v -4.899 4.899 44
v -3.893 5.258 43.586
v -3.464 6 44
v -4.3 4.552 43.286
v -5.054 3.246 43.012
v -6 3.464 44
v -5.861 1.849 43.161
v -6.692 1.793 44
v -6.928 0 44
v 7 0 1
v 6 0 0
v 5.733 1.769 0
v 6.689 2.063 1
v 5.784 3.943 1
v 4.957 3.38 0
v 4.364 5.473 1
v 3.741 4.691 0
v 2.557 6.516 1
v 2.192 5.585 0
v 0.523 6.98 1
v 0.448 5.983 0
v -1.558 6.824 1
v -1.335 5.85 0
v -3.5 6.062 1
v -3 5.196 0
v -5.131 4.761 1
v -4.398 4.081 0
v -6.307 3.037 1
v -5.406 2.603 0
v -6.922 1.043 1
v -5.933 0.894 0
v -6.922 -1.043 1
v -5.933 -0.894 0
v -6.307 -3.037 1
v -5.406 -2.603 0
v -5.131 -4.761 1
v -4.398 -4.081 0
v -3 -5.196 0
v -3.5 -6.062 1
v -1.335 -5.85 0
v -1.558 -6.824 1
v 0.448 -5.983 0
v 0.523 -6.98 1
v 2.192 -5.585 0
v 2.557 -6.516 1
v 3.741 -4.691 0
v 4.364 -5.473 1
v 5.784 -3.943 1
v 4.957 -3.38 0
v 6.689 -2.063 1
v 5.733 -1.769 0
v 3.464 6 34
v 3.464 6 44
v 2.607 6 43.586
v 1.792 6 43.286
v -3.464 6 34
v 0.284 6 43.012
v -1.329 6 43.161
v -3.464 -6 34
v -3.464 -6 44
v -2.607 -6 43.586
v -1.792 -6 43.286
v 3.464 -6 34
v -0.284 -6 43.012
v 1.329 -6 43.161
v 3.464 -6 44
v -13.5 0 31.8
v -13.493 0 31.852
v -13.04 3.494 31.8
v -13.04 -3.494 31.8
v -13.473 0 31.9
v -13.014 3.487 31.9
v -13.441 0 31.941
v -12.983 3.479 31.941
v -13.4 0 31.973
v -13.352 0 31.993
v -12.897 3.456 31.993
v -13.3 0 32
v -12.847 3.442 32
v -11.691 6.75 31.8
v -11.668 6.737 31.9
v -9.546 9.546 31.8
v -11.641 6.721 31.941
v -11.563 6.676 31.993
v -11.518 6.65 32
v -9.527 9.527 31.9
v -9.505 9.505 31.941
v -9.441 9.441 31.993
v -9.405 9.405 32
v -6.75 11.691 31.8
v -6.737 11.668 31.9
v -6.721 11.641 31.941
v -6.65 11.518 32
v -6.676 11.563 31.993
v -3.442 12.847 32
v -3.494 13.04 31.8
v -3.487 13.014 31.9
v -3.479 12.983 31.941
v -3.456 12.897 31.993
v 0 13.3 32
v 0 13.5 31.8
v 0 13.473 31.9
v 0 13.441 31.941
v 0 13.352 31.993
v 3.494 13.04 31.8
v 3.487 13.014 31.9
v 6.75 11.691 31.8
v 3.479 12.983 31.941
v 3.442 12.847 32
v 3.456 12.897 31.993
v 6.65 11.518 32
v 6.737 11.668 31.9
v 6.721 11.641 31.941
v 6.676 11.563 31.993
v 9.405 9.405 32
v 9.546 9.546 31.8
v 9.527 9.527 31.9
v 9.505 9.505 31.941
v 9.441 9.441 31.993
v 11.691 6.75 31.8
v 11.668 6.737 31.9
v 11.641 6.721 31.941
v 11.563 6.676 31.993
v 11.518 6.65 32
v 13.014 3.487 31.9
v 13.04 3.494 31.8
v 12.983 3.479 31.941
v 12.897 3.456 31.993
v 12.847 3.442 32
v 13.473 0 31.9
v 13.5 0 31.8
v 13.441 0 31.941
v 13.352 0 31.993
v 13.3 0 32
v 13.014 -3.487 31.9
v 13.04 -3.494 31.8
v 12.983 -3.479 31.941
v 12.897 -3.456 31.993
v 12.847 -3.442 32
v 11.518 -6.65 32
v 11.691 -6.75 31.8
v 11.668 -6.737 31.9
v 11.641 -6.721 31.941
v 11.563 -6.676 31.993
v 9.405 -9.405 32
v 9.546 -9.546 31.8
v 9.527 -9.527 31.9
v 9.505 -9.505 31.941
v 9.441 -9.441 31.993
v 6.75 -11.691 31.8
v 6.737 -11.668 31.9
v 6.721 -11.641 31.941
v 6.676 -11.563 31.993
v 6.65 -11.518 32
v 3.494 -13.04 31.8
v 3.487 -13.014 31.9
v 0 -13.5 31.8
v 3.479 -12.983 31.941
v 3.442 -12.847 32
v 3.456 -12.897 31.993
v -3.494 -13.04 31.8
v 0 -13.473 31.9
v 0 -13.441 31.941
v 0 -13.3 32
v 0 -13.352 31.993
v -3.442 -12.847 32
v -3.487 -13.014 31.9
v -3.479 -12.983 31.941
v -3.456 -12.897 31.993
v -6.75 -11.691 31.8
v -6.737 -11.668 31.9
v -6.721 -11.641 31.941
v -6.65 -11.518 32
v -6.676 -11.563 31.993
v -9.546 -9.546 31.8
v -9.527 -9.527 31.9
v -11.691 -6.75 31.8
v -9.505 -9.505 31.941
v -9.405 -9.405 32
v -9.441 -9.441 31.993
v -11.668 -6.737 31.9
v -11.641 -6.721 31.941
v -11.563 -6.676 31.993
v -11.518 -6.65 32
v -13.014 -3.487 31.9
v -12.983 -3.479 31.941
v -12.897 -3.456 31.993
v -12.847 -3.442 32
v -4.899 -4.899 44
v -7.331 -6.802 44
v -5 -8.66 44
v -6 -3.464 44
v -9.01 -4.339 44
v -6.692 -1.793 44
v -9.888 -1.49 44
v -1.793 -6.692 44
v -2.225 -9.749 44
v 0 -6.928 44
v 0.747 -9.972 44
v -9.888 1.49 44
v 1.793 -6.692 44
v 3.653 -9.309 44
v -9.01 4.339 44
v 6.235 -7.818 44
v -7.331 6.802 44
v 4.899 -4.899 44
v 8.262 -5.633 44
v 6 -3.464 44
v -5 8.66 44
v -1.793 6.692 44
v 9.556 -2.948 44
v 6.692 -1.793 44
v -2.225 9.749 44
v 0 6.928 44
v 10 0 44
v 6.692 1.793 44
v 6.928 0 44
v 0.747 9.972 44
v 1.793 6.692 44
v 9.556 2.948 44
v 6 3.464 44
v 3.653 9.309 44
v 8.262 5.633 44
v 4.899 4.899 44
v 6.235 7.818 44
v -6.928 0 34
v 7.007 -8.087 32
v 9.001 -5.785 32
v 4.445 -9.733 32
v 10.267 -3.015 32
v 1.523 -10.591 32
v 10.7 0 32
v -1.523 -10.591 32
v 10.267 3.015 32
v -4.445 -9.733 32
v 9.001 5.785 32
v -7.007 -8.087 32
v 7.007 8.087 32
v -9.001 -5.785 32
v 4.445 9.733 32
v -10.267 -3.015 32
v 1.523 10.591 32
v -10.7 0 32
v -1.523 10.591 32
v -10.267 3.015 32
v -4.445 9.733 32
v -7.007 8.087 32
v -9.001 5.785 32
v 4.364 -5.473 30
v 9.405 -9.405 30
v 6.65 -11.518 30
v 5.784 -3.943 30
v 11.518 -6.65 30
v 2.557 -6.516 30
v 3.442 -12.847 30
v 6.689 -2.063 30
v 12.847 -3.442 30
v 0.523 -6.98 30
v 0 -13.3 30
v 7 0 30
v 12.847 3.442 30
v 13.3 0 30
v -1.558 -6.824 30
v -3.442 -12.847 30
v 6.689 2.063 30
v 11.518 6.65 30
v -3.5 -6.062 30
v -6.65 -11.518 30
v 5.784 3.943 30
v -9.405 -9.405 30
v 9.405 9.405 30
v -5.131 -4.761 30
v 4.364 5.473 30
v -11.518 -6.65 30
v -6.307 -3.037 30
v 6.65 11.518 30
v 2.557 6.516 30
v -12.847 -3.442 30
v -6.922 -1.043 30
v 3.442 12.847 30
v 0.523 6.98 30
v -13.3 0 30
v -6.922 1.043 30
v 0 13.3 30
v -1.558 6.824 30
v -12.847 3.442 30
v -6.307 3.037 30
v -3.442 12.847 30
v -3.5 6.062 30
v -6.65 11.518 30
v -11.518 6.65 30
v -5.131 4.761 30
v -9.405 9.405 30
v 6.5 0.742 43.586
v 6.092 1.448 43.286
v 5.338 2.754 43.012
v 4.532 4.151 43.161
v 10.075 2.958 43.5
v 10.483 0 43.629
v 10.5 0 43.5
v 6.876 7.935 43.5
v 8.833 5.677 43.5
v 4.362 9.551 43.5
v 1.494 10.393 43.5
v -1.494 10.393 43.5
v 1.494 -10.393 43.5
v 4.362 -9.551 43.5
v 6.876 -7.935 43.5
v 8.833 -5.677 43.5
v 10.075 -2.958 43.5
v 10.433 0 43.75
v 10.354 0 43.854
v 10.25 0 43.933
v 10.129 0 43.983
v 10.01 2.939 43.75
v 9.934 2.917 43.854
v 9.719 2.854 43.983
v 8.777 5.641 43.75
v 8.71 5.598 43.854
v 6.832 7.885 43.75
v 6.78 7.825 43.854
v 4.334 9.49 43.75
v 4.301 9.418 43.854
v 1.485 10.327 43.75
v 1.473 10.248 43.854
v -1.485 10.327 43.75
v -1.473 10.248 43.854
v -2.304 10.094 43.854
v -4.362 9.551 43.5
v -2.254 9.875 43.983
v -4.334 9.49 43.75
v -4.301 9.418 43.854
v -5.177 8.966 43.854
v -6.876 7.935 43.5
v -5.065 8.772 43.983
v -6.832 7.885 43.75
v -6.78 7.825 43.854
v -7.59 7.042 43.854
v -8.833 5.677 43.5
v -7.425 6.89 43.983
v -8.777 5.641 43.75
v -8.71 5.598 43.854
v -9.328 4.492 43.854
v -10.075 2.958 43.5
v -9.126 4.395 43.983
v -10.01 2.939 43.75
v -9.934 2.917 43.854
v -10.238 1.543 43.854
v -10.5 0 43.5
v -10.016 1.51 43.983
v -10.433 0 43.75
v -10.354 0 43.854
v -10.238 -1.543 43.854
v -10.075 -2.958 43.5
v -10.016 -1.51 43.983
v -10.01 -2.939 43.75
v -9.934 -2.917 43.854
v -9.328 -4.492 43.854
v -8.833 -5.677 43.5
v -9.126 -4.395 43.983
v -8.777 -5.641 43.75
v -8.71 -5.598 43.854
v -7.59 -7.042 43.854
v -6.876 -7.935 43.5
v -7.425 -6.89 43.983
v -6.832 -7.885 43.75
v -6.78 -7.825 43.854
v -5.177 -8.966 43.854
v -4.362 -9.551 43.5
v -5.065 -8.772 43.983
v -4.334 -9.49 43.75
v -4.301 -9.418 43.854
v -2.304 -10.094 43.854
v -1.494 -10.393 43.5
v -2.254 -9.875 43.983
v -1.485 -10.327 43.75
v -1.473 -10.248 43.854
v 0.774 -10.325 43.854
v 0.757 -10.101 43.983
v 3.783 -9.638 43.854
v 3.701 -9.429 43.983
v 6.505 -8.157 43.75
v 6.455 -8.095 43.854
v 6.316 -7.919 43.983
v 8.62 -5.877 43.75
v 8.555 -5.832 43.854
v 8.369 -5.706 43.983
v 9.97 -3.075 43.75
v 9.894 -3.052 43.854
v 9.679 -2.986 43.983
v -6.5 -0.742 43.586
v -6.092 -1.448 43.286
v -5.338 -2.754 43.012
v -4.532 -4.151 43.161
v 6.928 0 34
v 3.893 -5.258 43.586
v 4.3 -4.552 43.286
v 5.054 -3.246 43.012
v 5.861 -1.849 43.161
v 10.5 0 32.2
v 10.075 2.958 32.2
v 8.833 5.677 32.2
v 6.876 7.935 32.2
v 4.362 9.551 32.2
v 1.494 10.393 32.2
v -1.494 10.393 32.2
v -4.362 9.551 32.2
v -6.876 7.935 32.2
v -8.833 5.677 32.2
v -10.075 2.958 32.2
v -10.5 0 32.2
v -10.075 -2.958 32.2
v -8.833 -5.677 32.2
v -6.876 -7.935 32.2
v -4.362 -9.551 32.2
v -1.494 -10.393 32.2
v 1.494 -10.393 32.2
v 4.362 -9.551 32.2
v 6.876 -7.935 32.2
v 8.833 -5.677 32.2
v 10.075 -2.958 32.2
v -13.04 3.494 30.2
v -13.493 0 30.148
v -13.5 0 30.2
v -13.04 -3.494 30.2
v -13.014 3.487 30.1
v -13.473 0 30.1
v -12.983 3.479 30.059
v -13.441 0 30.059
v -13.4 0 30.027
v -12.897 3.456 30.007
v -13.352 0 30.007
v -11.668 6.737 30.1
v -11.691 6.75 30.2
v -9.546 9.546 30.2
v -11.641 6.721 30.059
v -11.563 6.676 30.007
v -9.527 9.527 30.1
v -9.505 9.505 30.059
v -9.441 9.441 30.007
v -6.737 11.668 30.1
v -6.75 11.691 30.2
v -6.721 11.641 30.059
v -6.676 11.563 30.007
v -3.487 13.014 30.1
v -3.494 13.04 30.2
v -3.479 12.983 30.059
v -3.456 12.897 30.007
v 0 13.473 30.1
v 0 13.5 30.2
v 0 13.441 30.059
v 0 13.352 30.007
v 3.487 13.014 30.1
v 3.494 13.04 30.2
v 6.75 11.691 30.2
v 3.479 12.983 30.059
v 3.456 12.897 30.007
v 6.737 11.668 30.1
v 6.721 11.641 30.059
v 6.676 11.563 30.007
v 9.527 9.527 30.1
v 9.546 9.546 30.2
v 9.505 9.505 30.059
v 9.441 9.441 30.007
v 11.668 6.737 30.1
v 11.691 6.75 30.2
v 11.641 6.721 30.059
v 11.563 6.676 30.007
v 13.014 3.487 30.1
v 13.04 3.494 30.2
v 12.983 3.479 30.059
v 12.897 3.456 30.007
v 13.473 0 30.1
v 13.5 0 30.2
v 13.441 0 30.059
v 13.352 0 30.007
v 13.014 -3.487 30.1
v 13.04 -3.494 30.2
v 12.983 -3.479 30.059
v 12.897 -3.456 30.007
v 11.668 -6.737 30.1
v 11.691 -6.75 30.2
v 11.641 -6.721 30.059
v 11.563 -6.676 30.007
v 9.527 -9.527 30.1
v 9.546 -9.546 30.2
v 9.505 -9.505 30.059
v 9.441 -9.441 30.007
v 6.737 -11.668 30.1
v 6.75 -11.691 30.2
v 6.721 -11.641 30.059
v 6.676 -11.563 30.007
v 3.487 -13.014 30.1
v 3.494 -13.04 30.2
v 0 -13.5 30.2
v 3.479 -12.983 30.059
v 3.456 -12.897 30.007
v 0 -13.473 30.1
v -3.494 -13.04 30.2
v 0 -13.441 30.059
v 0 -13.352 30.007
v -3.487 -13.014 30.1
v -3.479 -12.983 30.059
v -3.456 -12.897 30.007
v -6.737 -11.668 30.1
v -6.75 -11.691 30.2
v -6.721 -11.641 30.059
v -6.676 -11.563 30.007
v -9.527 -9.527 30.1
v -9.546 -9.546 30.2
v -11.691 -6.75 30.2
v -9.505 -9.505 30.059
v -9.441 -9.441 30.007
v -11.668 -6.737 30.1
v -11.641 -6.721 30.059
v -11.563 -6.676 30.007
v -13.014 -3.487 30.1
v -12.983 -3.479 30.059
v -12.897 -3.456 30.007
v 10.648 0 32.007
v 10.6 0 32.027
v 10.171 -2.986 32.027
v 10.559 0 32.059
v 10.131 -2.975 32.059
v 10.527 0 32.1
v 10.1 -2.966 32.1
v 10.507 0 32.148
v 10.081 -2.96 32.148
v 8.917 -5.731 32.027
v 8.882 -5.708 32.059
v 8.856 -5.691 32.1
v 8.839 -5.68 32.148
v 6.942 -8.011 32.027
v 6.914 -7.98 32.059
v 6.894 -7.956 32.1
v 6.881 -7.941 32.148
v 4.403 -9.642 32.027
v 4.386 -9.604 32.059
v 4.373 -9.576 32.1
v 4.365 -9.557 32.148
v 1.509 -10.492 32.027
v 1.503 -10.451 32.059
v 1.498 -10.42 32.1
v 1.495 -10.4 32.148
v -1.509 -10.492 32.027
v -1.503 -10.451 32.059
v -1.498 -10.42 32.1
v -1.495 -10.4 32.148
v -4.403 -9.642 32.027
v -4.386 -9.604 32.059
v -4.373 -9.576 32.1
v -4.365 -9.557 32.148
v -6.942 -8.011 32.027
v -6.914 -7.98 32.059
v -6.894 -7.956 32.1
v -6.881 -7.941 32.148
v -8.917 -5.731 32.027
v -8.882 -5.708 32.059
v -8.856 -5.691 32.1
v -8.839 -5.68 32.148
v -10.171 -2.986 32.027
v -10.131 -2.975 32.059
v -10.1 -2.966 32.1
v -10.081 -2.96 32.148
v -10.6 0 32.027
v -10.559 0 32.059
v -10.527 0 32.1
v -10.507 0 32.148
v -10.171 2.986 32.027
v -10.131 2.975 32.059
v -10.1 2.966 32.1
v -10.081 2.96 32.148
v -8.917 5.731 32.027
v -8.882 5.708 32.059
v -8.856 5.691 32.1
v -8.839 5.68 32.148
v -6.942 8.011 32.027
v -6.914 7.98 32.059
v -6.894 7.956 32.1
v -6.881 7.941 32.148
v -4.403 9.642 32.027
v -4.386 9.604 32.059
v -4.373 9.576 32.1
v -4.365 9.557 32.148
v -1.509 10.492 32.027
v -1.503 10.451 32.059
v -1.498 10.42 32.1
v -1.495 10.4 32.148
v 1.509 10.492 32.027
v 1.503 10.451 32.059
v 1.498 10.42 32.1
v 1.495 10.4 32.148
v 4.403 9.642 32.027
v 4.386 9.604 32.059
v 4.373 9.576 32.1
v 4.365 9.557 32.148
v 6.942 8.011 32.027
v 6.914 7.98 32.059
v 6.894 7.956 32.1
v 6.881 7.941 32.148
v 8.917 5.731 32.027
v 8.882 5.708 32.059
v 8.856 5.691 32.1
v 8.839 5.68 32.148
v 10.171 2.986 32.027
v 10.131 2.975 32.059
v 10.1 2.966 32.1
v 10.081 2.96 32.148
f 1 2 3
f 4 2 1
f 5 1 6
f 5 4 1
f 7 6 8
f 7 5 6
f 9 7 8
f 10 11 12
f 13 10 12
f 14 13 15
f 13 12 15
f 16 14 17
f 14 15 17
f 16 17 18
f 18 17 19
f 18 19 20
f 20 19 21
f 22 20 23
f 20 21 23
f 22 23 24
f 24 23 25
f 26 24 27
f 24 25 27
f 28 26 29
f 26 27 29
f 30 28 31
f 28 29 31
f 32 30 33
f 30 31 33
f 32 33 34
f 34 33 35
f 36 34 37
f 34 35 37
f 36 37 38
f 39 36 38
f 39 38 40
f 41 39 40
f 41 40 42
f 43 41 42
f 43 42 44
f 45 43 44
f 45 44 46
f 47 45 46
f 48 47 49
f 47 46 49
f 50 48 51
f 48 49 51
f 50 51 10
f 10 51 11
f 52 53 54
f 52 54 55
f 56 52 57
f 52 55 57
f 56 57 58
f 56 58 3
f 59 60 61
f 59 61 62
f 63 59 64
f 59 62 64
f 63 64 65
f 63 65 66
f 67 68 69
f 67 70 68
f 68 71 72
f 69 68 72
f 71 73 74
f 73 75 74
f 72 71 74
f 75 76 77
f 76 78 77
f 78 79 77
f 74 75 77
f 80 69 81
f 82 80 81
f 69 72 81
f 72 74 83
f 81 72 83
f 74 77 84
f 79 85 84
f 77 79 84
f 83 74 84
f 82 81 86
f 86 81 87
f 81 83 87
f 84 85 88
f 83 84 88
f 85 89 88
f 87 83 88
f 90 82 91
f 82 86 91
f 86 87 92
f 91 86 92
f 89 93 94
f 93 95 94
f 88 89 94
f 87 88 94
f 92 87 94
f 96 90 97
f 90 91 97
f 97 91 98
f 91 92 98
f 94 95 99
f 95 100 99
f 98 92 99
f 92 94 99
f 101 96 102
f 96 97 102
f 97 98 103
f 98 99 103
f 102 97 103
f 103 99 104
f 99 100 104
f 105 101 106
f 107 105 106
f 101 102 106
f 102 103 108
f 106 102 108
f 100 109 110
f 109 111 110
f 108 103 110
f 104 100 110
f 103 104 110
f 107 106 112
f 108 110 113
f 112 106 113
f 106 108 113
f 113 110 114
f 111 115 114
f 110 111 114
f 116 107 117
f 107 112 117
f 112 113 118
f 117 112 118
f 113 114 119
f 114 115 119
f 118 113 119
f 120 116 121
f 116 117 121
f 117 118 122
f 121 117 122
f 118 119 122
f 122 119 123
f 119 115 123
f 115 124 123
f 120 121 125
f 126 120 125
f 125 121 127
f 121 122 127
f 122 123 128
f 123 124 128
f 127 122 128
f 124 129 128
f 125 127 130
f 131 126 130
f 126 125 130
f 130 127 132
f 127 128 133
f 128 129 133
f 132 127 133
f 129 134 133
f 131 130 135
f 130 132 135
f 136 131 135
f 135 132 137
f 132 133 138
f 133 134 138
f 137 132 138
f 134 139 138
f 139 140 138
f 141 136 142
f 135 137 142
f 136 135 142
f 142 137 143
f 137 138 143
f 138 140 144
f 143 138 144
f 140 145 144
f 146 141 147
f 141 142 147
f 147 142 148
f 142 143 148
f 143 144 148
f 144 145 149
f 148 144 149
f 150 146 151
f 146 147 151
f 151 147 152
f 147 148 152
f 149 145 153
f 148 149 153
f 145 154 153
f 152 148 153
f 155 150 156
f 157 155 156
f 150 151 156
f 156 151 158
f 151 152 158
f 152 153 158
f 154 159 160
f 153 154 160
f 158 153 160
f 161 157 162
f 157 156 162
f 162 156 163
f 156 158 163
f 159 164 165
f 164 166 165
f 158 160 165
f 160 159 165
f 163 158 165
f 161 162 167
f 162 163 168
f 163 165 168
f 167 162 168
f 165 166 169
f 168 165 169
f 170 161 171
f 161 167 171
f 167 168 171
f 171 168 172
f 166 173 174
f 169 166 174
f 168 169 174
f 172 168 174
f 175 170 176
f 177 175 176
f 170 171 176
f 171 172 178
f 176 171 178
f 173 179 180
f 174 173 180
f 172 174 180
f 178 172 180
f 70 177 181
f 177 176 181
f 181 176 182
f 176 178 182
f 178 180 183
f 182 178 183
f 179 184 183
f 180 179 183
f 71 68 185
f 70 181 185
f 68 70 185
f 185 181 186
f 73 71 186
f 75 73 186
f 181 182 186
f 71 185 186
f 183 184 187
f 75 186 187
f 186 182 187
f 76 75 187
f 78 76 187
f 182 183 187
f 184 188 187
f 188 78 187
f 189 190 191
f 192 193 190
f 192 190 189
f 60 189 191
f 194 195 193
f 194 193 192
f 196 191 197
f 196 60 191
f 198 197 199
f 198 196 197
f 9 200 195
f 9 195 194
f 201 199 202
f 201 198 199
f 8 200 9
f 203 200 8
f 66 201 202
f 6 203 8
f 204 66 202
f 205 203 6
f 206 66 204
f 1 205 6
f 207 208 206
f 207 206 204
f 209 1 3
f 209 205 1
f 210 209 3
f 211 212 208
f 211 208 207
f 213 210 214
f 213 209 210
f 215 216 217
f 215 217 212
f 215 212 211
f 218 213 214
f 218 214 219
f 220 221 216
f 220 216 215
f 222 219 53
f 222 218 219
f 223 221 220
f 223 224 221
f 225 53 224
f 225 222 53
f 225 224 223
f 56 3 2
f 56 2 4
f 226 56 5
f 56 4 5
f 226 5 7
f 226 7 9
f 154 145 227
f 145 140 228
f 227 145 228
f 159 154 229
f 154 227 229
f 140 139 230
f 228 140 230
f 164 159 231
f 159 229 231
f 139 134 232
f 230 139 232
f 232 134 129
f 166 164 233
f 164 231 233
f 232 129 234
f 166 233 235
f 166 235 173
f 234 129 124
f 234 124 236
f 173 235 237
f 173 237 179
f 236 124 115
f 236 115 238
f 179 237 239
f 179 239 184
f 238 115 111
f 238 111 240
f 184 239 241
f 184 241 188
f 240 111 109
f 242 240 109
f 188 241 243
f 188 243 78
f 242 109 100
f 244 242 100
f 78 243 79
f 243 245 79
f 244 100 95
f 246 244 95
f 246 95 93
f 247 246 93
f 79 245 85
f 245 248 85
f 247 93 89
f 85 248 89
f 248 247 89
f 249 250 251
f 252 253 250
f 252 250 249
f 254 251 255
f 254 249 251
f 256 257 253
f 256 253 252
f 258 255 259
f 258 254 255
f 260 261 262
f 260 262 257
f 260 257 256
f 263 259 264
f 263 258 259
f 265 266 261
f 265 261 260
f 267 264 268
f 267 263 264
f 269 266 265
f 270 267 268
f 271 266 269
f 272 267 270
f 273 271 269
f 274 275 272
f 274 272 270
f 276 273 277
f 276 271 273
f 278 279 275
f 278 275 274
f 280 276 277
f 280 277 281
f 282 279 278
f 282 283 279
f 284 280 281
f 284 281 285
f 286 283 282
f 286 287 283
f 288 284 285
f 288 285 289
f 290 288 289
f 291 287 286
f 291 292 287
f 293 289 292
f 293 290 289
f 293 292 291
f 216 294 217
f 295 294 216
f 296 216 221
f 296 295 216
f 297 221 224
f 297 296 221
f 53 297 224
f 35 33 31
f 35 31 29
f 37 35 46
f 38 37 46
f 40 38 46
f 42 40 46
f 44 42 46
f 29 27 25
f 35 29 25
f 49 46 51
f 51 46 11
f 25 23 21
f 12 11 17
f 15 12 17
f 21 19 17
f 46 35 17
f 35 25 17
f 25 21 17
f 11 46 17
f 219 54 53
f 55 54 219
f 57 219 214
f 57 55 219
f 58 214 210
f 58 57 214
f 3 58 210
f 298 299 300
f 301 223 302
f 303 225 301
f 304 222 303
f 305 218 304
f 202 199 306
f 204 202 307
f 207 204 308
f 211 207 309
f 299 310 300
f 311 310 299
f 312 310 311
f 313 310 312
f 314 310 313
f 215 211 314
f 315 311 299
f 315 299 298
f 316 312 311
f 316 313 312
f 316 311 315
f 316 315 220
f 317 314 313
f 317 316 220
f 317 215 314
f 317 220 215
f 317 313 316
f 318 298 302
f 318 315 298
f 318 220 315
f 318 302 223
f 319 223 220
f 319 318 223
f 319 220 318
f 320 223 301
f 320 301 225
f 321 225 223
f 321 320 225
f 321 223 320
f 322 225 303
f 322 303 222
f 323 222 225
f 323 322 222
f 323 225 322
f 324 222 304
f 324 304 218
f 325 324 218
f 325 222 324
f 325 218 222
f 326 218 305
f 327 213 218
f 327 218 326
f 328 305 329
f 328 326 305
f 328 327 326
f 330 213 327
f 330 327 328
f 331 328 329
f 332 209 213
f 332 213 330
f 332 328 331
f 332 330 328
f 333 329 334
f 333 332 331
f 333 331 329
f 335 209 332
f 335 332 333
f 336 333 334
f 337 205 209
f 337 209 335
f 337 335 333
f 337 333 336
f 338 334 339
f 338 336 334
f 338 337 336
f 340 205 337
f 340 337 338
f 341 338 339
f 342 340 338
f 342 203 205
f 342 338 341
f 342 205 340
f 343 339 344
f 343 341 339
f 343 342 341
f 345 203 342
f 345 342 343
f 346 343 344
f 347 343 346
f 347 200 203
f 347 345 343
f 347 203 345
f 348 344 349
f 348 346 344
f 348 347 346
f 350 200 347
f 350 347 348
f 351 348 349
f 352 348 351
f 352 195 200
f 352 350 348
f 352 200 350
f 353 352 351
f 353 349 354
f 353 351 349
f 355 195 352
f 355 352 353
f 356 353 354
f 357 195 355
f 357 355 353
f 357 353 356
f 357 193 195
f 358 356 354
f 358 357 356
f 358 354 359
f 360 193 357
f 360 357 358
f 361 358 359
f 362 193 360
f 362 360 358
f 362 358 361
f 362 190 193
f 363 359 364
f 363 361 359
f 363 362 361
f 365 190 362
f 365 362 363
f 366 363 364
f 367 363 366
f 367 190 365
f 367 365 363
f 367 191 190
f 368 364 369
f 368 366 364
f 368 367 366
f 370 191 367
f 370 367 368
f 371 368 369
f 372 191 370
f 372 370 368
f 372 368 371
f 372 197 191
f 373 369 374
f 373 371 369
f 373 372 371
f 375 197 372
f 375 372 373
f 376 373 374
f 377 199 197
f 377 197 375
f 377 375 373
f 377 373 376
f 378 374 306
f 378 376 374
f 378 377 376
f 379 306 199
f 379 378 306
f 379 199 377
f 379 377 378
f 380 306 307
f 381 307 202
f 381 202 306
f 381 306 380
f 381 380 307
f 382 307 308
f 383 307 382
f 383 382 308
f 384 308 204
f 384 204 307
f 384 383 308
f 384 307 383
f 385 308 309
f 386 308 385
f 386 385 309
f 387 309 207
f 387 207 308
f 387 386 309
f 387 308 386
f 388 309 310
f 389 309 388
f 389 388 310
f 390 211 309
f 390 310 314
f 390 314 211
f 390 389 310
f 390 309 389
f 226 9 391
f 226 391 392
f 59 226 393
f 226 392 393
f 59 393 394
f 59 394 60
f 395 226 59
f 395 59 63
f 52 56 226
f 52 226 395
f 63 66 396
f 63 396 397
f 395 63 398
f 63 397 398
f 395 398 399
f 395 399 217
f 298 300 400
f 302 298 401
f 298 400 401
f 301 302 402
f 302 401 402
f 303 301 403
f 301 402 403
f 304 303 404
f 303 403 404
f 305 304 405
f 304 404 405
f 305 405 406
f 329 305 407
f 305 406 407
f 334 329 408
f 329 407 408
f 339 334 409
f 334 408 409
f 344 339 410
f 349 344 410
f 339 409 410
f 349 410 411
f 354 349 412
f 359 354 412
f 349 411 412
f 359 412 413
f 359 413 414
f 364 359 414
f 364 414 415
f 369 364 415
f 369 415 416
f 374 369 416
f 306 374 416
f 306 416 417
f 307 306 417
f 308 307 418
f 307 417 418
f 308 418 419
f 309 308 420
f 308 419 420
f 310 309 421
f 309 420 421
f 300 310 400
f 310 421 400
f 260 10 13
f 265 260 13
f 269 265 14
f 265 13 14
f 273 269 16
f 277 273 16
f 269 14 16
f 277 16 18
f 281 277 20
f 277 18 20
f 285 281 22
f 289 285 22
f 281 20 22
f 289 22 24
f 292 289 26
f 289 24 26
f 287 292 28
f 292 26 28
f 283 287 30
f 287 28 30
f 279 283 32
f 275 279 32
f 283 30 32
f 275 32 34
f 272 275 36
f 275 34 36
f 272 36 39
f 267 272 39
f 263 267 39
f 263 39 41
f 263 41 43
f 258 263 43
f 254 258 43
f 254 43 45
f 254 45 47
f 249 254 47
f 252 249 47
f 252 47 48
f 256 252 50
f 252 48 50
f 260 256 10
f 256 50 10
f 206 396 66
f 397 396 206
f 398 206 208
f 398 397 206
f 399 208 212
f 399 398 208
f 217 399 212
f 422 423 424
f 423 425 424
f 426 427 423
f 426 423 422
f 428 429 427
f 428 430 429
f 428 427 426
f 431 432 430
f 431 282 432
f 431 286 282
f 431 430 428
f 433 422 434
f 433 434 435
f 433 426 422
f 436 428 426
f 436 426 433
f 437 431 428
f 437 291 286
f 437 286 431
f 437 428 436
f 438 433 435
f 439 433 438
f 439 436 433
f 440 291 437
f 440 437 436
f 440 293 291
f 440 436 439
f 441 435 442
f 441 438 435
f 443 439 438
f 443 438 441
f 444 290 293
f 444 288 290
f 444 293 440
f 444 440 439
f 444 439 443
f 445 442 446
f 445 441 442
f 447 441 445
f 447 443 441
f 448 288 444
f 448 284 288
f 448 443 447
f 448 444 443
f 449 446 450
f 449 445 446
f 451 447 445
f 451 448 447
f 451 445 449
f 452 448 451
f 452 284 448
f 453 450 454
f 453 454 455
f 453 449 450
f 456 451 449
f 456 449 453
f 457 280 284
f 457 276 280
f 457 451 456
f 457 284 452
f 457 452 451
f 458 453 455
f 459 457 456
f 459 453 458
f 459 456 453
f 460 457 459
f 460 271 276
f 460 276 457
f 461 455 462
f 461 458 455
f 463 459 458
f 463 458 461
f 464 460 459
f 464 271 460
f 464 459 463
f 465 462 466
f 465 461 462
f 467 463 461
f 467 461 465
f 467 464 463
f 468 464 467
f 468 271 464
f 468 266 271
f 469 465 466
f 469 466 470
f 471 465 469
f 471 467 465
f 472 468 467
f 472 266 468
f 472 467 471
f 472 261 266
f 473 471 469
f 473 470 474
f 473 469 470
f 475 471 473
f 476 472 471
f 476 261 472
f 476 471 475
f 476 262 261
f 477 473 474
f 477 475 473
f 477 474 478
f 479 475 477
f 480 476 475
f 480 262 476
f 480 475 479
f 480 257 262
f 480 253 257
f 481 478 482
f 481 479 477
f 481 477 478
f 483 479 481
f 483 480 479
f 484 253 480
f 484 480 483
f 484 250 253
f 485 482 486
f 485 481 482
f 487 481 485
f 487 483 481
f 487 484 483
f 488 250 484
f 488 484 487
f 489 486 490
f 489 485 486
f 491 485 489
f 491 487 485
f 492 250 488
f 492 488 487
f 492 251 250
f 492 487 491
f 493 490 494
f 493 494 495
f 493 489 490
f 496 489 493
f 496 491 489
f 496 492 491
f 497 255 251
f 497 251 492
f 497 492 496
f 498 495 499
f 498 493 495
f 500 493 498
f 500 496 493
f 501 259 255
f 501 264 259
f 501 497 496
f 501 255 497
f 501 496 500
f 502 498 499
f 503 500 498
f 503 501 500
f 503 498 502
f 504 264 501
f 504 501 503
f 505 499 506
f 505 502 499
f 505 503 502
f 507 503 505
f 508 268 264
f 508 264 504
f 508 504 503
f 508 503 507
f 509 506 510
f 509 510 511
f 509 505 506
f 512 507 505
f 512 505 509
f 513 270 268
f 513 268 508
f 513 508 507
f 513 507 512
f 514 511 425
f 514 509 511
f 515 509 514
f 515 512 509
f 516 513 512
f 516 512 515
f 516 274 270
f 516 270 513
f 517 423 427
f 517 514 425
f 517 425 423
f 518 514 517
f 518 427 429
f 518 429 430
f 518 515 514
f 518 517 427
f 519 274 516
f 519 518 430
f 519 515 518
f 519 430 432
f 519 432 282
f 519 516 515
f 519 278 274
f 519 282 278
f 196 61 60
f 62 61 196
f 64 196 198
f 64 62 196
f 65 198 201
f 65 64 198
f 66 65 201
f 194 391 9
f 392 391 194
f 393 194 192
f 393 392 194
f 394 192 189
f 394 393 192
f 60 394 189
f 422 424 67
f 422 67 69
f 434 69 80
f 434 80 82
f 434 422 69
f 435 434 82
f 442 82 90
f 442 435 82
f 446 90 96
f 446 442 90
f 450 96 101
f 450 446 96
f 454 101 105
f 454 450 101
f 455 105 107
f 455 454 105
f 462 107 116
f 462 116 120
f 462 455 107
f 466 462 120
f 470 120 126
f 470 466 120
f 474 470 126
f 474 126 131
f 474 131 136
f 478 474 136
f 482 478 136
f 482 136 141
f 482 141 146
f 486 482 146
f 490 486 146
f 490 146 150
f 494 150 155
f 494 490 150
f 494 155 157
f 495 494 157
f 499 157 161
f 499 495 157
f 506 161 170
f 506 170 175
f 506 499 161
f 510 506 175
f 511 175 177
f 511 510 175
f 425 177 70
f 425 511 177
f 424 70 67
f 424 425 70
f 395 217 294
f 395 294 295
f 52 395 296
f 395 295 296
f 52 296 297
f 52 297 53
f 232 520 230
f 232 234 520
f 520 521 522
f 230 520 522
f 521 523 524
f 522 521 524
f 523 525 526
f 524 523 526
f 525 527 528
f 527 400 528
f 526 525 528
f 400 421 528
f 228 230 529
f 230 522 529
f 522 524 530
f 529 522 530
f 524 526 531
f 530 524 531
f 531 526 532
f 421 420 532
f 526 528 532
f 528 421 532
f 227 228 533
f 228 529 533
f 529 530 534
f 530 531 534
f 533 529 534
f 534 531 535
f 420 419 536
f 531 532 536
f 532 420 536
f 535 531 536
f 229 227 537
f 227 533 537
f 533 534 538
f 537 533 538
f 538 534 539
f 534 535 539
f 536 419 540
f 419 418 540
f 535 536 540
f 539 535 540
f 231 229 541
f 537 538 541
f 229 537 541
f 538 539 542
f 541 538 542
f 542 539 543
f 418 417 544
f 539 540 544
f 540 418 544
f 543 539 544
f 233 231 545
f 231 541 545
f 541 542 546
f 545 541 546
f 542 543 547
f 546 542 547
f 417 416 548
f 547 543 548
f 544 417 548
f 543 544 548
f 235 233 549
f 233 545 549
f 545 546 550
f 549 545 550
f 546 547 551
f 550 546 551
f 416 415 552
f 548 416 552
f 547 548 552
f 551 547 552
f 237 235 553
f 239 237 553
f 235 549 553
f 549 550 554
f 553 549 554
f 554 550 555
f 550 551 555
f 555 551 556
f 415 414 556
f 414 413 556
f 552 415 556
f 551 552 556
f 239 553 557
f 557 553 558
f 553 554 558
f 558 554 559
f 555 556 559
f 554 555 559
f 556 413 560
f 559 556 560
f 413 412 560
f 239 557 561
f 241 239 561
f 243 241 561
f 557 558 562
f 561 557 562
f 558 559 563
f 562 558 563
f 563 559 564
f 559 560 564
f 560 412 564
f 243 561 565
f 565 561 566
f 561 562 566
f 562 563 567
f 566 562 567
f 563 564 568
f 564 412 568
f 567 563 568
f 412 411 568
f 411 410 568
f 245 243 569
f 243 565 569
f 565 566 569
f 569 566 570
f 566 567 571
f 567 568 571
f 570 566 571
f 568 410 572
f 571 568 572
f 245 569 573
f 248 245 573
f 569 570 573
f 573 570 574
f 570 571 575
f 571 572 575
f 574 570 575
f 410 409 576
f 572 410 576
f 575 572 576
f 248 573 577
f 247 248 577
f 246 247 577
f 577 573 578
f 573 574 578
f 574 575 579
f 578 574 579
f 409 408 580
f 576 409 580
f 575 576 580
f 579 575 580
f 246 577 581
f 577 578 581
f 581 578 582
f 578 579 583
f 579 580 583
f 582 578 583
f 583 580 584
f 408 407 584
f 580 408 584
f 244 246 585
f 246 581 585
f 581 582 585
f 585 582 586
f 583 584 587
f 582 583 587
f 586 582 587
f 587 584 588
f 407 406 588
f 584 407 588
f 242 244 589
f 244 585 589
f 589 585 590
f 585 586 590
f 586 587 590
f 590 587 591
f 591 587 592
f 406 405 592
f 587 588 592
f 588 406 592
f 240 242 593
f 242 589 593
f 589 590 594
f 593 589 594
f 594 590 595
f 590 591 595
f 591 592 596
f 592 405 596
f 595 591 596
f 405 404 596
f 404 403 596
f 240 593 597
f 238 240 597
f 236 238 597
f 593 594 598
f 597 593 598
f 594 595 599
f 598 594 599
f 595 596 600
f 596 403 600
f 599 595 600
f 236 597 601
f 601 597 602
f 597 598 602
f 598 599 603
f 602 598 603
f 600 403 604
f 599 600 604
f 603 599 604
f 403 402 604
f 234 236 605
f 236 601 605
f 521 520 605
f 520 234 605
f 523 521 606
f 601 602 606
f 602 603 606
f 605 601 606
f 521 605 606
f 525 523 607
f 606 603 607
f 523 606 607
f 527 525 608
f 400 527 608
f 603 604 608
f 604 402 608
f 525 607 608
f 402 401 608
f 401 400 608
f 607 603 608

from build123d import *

# Parameters (mm, degrees)
SCHIZZO1_R                   = 7
ESTRUSIONE_ESTRUSIONE1_DEPTH = 30
SMUSSO1_SIZE                 = 1
SCHIZZO6_R                   = 10.5
ESTRUSIONE_ESTRUSIONE3_DEPTH = 14
TAGLIO_ESTRUSIONE3_DEPTH     = 10
SCHIZZO8_R                   = 6.92820323
TAGLIO_ESTRUSIONE4_DEPTH     = 1
TAGLIO_ESTRUSIONE4_TAPER     = 43
RACCORDO5_R                  = 0.5
SCHIZZO9_R                   = 13.5
SCHIZZO9_R_2                 = 10.5
ESTRUSIONE_ESTRUSIONE4_DEPTH = 2
RACCORDO6_R                  = 0.2


with BuildPart() as part:
    # Schizzo1 → Estrusione-Estrusione1 (new body)
    with BuildSketch(Plane.XY):
        Circle(SCHIZZO1_R)
    extrude(amount=ESTRUSIONE_ESTRUSIONE1_DEPTH)

    # Smusso1
    smusso1_edges = [part.edges().sort_by_distance(p)[0] for p in [
        (-7, 0, 0),
    ]]
    chamfer(smusso1_edges, length=SMUSSO1_SIZE)

    # Schizzo6 → Estrusione-Estrusione3 (add)
    with BuildSketch(Plane.XY.offset(30)):
        Circle(SCHIZZO6_R)
    extrude(amount=ESTRUSIONE_ESTRUSIONE3_DEPTH)

    # Schizzo7 → Taglio-Estrusione3 (cut)
    with BuildSketch(Plane.XY.offset(44)):
        Polygon((3.464101615, 6), (-3.464101615, 6), (-6.92820323, 0), (-3.464101615, -6), (3.464101615, -6), (6.92820323, 0), align=None)
    extrude(amount=-TAGLIO_ESTRUSIONE3_DEPTH, mode=Mode.SUBTRACT)

    # Schizzo8 → Taglio-Estrusione4 (cut)
    with BuildSketch(Plane.XY.offset(44)):
        Circle(SCHIZZO8_R)
    extrude(amount=-TAGLIO_ESTRUSIONE4_DEPTH, taper=TAGLIO_ESTRUSIONE4_TAPER, mode=Mode.SUBTRACT)

    # Raccordo5
    raccordo5_edges = [part.edges().sort_by_distance(p)[0] for p in [
        (-10.5, 0, 44),
    ]]
    fillet(raccordo5_edges, radius=RACCORDO5_R)

    # Schizzo9 → Estrusione-Estrusione4 (add)
    with BuildSketch(Plane(origin=(0, 0, 30), x_dir=(-1, 0, 0), z_dir=(0, 0, -1))):
        Circle(SCHIZZO9_R)
        Circle(SCHIZZO9_R_2, mode=Mode.SUBTRACT)
    extrude(amount=-ESTRUSIONE_ESTRUSIONE4_DEPTH)

    # Raccordo6
    raccordo6_edges = [part.edges().sort_by_distance(p)[0] for p in [
        (-10.5, 0, 32),
        (13.5, 0, 32),
        (13.5, 0, 30),
    ]]
    fillet(raccordo6_edges, radius=RACCORDO6_R)


solid = part.part
